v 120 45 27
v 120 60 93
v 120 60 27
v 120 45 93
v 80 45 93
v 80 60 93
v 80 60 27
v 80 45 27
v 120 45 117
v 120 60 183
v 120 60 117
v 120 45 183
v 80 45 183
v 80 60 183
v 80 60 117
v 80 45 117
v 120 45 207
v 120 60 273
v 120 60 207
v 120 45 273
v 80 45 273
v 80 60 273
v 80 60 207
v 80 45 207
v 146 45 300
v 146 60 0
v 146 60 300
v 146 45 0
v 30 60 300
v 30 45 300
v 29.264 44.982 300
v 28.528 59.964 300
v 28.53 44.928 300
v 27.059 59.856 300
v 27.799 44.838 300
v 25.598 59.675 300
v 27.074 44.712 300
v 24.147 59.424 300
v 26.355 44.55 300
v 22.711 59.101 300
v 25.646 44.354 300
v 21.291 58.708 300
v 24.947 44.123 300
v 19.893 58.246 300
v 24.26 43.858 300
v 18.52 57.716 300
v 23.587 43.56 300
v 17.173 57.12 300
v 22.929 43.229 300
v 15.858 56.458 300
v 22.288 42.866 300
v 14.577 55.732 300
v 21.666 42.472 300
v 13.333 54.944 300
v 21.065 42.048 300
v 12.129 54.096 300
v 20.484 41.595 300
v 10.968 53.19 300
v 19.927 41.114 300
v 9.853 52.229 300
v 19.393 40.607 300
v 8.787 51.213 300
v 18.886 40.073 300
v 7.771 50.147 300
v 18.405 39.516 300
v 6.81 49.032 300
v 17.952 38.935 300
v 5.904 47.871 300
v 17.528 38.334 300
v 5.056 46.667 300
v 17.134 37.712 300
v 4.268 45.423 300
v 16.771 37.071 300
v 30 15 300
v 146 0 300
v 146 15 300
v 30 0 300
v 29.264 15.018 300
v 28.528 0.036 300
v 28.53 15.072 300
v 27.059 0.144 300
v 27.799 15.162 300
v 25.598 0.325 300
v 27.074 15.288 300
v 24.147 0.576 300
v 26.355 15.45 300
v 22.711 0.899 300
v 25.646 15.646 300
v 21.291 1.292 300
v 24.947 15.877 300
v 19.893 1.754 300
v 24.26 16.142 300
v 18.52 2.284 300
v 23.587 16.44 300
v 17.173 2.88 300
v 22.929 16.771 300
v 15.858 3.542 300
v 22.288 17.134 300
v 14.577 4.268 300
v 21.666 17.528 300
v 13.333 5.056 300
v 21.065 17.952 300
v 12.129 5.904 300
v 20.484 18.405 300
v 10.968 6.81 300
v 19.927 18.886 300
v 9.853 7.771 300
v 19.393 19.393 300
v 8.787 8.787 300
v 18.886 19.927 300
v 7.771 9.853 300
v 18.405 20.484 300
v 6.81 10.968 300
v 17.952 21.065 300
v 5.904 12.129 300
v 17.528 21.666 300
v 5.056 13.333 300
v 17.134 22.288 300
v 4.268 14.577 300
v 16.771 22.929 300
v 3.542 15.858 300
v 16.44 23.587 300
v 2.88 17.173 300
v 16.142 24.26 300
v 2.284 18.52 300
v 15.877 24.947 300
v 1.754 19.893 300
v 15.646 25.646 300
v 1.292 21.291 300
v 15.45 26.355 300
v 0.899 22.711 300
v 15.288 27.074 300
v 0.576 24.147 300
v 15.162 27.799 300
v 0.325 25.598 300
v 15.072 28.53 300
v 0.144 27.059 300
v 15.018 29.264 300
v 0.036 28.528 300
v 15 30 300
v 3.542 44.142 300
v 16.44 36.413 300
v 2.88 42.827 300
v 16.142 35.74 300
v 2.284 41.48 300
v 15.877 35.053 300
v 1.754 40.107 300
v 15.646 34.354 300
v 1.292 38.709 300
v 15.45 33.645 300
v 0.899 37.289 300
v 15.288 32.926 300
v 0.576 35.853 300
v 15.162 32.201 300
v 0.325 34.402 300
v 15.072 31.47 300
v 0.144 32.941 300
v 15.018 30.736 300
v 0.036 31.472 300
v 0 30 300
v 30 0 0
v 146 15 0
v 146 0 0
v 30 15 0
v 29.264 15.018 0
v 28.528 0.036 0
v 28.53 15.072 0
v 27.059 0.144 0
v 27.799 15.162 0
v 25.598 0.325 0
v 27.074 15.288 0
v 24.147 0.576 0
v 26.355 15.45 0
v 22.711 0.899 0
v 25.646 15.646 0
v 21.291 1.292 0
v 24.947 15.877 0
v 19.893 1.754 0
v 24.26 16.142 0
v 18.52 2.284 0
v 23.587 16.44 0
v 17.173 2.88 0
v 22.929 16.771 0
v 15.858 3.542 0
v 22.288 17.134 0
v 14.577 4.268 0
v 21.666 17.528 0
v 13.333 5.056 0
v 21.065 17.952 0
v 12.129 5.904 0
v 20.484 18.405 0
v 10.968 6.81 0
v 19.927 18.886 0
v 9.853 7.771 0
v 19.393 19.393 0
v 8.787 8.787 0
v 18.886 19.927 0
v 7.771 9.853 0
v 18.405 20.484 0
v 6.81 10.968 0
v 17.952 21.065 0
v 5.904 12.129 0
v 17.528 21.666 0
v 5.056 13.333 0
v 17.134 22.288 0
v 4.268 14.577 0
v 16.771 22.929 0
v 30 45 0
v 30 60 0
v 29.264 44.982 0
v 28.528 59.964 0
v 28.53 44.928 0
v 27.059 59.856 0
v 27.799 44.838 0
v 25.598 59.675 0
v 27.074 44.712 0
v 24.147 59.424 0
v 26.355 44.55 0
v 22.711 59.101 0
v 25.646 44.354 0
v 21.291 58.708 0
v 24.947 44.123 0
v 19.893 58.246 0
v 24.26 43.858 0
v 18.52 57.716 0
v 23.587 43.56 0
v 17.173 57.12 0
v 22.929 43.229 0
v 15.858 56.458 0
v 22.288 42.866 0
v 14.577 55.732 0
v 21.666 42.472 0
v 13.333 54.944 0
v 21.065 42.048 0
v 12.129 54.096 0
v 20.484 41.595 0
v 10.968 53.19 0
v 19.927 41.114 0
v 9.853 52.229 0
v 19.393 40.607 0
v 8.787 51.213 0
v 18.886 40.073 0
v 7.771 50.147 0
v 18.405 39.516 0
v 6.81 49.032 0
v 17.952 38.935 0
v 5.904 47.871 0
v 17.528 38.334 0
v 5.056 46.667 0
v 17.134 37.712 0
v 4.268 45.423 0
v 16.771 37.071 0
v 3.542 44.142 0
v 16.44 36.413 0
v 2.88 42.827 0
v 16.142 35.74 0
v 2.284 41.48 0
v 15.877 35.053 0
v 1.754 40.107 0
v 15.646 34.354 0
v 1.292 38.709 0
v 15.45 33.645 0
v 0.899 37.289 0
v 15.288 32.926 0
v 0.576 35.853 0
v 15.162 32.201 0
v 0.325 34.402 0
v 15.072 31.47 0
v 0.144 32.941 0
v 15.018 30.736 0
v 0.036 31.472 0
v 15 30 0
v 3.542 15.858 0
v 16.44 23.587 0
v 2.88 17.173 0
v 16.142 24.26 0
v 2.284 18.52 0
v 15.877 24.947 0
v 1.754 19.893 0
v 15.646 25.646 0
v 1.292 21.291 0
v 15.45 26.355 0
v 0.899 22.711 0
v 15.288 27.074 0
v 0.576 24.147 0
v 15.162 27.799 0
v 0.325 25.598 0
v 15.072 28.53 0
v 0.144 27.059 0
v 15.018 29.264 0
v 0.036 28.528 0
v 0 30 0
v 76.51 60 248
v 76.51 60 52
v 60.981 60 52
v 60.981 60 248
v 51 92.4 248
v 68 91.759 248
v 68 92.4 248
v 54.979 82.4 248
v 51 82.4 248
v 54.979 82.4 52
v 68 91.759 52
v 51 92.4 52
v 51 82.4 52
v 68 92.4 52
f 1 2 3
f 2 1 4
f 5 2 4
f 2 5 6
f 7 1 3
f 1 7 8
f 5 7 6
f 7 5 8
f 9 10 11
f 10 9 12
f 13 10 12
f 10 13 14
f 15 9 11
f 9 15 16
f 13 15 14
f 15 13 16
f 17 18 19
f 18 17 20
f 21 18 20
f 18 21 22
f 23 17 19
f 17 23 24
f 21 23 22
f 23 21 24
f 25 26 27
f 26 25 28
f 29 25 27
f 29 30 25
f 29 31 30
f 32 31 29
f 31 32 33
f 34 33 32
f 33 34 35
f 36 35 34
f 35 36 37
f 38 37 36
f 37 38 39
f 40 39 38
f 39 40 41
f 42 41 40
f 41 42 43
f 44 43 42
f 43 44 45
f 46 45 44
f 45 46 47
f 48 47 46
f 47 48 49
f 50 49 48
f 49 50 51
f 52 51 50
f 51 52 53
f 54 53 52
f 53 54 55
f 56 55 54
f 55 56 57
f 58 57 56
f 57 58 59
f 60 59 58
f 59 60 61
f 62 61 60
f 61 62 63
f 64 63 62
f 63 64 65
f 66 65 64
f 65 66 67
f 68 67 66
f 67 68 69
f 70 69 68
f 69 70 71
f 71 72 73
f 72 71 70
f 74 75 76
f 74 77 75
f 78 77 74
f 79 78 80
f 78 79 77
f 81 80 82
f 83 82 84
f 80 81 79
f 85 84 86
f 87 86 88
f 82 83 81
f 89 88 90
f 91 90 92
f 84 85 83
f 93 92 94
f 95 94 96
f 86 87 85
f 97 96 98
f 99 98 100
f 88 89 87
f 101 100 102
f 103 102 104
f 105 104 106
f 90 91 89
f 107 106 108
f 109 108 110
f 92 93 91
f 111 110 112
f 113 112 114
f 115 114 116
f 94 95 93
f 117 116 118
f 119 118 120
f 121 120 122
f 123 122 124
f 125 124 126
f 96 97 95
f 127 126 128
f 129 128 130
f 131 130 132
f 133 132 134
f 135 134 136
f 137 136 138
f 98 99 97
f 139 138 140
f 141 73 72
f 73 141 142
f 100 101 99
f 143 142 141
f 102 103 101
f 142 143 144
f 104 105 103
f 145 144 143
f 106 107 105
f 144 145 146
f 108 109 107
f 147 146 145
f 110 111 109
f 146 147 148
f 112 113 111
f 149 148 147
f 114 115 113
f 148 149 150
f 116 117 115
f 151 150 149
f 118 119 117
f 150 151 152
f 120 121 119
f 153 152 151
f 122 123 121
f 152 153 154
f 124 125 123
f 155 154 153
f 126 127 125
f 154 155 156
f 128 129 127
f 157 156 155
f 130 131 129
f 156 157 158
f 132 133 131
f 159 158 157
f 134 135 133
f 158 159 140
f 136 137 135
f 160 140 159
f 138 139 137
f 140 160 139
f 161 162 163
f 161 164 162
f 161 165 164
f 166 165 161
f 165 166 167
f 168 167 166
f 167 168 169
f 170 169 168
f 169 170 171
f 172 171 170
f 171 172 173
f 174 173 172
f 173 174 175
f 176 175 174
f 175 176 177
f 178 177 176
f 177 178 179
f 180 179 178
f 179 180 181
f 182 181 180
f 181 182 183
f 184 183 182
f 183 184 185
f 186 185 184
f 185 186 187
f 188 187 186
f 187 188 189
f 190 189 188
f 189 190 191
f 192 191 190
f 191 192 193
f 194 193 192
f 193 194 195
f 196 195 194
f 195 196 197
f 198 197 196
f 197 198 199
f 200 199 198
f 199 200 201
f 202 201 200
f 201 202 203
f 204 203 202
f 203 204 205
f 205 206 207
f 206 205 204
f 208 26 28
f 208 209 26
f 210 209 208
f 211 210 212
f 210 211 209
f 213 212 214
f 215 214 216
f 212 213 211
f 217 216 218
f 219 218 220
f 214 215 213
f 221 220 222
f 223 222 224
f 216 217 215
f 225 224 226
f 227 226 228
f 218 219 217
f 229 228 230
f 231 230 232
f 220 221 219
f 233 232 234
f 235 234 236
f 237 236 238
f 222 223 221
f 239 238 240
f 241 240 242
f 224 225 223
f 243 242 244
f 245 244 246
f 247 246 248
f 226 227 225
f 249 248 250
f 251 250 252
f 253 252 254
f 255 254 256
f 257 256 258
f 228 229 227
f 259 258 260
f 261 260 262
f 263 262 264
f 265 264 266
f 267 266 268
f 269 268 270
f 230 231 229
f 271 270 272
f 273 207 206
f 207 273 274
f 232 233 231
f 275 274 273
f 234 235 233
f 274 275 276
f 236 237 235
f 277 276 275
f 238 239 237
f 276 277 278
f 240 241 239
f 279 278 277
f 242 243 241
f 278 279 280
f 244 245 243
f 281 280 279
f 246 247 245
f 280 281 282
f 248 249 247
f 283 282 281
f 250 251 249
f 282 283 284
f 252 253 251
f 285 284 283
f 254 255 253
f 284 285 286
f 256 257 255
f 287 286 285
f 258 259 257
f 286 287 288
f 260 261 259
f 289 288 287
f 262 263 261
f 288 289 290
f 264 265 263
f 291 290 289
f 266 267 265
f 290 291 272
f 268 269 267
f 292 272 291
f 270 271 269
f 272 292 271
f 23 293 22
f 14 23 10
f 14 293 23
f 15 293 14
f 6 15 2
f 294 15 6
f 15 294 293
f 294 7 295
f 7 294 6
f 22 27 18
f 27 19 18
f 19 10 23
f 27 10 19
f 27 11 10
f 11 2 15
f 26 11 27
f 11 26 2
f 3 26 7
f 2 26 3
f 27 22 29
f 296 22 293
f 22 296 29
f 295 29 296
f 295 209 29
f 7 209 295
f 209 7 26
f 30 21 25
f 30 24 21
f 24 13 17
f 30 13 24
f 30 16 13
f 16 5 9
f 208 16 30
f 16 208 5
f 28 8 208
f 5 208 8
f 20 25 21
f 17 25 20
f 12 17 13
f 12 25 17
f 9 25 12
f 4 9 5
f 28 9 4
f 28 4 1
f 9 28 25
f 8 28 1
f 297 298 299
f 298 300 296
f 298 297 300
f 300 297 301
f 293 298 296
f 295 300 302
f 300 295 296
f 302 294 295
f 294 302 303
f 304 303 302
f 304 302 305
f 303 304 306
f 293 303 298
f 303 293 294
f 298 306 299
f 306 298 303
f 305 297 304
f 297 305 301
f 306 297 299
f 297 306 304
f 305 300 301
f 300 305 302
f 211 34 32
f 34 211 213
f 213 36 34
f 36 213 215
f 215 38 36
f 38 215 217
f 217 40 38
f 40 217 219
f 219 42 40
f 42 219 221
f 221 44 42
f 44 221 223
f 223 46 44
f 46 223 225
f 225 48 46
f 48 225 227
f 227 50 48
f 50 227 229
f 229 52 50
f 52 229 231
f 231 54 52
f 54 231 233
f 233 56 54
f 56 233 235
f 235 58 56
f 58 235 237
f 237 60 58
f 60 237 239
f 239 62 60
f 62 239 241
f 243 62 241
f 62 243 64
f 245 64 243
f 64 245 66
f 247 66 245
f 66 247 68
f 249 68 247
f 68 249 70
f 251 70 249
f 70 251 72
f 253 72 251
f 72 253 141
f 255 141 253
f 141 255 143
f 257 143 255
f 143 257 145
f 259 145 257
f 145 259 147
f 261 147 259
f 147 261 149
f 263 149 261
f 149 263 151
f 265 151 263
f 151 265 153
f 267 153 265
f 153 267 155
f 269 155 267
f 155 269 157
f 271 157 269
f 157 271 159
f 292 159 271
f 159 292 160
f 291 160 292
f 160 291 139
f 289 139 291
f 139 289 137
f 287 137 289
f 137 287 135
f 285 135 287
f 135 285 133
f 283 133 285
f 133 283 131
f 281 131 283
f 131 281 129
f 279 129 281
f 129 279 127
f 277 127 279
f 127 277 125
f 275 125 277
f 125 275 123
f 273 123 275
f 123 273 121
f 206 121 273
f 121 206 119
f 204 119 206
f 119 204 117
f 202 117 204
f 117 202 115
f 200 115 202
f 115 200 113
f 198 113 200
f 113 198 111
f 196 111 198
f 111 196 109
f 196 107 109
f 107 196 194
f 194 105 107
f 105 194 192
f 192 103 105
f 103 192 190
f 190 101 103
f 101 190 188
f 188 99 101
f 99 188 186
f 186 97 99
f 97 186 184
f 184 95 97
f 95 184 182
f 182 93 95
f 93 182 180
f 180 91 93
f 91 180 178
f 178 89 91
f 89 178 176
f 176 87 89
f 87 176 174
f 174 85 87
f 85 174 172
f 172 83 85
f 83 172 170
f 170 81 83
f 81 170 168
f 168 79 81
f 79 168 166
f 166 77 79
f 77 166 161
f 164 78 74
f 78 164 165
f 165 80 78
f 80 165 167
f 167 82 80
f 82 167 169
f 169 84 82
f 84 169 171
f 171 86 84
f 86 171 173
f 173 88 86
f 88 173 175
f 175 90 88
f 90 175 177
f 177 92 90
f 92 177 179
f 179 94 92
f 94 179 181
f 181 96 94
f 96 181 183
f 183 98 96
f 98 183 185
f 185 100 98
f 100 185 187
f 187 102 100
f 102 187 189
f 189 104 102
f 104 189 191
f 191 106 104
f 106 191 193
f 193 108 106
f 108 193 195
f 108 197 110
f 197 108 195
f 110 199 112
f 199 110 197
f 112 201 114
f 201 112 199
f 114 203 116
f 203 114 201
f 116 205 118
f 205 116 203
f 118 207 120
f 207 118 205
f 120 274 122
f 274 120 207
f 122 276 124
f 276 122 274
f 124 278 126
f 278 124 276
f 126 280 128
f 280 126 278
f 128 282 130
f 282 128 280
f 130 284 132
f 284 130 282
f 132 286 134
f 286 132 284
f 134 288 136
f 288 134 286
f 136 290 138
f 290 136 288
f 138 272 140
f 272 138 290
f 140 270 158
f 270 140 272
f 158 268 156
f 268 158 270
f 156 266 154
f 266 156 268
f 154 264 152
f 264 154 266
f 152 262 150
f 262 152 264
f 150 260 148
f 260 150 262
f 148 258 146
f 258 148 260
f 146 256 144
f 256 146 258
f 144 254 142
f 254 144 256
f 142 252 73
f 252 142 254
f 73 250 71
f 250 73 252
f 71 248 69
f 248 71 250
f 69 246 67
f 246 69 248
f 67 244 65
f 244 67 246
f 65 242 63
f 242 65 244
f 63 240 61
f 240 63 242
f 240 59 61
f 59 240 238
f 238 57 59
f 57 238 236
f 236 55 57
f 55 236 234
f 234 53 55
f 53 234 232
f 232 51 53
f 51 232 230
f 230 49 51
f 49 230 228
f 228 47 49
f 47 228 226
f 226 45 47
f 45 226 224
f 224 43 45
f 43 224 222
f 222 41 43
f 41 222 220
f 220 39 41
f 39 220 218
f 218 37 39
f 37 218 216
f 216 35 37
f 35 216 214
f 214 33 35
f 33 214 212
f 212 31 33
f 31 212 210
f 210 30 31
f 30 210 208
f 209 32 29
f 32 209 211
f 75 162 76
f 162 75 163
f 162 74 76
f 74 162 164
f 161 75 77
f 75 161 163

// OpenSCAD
/**
 * Nespresso Krups Essenza Mini NX1108 water resevoir clip
 *
 * @copyright 2022, Joffrey van Wageningen <joffrey@ne2000.nl>
 * @license Creative Commons 4.0 BY-SA (https://creativecommons.org/licenses/by/4.0/)
 * 
 * Modules sector and arc
 * @copyright Justin Lin
 * @link https://openhome.cc/eGossip/OpenSCAD/SectorArc.html
 */

module sector(radius, angles, fn = 32) {
    r = radius / cos(180 / fn);
    step = -360 / fn;

    points = concat([[0, 0]],
        [for(a = [angles[0] : step : angles[1] - 360]) 
            [r * cos(a), r * sin(a)]
        ],
        [[r * cos(angles[1]), r * sin(angles[1])]]
    );

    difference() {
        circle(radius, $fn = fn);
        polygon(points);
    }
}

module arc(radius, angles, width = 1, fn = 32) {
    difference() {
        sector(radius + width, angles, fn);
        sector(radius, angles, fn);
    }
}

object_height = 300;
object_length = 146;
object_width = 60;

wall_thickness = 15;
wall_height = object_length - (object_width / 2);

window_width = 66;
window_height = 40;
window_offset = 27;
window_spacing = 24;

clip_offset = 25;

// arc
translate([object_width / 2, object_width / 2, 0]) { 
    linear_extrude(object_height) arc((object_width / 2) - wall_thickness, [90, 270], wall_thickness, 128); 
}; 
    
// wall 1
translate([object_width / 2, (object_width / 2) + wall_thickness, 0]) {
  difference() {
    // a box
    cube([object_length - (object_width / 2), wall_thickness, object_height]);
      
    // with 3 holes
    for(i = [0:1:2]) {
      translate([wall_height - window_width, -1, i * (window_spacing + window_width) + window_offset]) { 
        cube([window_height, wall_thickness + 2, window_width]); 
      };
    };  
  };

  clip_length = object_height - (2 * window_offset) - (2 * clip_offset);

  // clip in 15 degree angle
  translate([35, 0, window_offset + clip_offset]) { 
    rotate([0, 0, 15]) {
      cube([15, wall_thickness + 30, clip_length]);
    };
  };

  // exact positioning of clip ridge
  translate([21, 37.4, window_offset + clip_offset]) { 
    cube([17, 10, clip_length]);
  };
};    

// wall 2
translate([object_width / 2, 0, 0]) { 
    cube([wall_height, wall_thickness, object_height]);
};
